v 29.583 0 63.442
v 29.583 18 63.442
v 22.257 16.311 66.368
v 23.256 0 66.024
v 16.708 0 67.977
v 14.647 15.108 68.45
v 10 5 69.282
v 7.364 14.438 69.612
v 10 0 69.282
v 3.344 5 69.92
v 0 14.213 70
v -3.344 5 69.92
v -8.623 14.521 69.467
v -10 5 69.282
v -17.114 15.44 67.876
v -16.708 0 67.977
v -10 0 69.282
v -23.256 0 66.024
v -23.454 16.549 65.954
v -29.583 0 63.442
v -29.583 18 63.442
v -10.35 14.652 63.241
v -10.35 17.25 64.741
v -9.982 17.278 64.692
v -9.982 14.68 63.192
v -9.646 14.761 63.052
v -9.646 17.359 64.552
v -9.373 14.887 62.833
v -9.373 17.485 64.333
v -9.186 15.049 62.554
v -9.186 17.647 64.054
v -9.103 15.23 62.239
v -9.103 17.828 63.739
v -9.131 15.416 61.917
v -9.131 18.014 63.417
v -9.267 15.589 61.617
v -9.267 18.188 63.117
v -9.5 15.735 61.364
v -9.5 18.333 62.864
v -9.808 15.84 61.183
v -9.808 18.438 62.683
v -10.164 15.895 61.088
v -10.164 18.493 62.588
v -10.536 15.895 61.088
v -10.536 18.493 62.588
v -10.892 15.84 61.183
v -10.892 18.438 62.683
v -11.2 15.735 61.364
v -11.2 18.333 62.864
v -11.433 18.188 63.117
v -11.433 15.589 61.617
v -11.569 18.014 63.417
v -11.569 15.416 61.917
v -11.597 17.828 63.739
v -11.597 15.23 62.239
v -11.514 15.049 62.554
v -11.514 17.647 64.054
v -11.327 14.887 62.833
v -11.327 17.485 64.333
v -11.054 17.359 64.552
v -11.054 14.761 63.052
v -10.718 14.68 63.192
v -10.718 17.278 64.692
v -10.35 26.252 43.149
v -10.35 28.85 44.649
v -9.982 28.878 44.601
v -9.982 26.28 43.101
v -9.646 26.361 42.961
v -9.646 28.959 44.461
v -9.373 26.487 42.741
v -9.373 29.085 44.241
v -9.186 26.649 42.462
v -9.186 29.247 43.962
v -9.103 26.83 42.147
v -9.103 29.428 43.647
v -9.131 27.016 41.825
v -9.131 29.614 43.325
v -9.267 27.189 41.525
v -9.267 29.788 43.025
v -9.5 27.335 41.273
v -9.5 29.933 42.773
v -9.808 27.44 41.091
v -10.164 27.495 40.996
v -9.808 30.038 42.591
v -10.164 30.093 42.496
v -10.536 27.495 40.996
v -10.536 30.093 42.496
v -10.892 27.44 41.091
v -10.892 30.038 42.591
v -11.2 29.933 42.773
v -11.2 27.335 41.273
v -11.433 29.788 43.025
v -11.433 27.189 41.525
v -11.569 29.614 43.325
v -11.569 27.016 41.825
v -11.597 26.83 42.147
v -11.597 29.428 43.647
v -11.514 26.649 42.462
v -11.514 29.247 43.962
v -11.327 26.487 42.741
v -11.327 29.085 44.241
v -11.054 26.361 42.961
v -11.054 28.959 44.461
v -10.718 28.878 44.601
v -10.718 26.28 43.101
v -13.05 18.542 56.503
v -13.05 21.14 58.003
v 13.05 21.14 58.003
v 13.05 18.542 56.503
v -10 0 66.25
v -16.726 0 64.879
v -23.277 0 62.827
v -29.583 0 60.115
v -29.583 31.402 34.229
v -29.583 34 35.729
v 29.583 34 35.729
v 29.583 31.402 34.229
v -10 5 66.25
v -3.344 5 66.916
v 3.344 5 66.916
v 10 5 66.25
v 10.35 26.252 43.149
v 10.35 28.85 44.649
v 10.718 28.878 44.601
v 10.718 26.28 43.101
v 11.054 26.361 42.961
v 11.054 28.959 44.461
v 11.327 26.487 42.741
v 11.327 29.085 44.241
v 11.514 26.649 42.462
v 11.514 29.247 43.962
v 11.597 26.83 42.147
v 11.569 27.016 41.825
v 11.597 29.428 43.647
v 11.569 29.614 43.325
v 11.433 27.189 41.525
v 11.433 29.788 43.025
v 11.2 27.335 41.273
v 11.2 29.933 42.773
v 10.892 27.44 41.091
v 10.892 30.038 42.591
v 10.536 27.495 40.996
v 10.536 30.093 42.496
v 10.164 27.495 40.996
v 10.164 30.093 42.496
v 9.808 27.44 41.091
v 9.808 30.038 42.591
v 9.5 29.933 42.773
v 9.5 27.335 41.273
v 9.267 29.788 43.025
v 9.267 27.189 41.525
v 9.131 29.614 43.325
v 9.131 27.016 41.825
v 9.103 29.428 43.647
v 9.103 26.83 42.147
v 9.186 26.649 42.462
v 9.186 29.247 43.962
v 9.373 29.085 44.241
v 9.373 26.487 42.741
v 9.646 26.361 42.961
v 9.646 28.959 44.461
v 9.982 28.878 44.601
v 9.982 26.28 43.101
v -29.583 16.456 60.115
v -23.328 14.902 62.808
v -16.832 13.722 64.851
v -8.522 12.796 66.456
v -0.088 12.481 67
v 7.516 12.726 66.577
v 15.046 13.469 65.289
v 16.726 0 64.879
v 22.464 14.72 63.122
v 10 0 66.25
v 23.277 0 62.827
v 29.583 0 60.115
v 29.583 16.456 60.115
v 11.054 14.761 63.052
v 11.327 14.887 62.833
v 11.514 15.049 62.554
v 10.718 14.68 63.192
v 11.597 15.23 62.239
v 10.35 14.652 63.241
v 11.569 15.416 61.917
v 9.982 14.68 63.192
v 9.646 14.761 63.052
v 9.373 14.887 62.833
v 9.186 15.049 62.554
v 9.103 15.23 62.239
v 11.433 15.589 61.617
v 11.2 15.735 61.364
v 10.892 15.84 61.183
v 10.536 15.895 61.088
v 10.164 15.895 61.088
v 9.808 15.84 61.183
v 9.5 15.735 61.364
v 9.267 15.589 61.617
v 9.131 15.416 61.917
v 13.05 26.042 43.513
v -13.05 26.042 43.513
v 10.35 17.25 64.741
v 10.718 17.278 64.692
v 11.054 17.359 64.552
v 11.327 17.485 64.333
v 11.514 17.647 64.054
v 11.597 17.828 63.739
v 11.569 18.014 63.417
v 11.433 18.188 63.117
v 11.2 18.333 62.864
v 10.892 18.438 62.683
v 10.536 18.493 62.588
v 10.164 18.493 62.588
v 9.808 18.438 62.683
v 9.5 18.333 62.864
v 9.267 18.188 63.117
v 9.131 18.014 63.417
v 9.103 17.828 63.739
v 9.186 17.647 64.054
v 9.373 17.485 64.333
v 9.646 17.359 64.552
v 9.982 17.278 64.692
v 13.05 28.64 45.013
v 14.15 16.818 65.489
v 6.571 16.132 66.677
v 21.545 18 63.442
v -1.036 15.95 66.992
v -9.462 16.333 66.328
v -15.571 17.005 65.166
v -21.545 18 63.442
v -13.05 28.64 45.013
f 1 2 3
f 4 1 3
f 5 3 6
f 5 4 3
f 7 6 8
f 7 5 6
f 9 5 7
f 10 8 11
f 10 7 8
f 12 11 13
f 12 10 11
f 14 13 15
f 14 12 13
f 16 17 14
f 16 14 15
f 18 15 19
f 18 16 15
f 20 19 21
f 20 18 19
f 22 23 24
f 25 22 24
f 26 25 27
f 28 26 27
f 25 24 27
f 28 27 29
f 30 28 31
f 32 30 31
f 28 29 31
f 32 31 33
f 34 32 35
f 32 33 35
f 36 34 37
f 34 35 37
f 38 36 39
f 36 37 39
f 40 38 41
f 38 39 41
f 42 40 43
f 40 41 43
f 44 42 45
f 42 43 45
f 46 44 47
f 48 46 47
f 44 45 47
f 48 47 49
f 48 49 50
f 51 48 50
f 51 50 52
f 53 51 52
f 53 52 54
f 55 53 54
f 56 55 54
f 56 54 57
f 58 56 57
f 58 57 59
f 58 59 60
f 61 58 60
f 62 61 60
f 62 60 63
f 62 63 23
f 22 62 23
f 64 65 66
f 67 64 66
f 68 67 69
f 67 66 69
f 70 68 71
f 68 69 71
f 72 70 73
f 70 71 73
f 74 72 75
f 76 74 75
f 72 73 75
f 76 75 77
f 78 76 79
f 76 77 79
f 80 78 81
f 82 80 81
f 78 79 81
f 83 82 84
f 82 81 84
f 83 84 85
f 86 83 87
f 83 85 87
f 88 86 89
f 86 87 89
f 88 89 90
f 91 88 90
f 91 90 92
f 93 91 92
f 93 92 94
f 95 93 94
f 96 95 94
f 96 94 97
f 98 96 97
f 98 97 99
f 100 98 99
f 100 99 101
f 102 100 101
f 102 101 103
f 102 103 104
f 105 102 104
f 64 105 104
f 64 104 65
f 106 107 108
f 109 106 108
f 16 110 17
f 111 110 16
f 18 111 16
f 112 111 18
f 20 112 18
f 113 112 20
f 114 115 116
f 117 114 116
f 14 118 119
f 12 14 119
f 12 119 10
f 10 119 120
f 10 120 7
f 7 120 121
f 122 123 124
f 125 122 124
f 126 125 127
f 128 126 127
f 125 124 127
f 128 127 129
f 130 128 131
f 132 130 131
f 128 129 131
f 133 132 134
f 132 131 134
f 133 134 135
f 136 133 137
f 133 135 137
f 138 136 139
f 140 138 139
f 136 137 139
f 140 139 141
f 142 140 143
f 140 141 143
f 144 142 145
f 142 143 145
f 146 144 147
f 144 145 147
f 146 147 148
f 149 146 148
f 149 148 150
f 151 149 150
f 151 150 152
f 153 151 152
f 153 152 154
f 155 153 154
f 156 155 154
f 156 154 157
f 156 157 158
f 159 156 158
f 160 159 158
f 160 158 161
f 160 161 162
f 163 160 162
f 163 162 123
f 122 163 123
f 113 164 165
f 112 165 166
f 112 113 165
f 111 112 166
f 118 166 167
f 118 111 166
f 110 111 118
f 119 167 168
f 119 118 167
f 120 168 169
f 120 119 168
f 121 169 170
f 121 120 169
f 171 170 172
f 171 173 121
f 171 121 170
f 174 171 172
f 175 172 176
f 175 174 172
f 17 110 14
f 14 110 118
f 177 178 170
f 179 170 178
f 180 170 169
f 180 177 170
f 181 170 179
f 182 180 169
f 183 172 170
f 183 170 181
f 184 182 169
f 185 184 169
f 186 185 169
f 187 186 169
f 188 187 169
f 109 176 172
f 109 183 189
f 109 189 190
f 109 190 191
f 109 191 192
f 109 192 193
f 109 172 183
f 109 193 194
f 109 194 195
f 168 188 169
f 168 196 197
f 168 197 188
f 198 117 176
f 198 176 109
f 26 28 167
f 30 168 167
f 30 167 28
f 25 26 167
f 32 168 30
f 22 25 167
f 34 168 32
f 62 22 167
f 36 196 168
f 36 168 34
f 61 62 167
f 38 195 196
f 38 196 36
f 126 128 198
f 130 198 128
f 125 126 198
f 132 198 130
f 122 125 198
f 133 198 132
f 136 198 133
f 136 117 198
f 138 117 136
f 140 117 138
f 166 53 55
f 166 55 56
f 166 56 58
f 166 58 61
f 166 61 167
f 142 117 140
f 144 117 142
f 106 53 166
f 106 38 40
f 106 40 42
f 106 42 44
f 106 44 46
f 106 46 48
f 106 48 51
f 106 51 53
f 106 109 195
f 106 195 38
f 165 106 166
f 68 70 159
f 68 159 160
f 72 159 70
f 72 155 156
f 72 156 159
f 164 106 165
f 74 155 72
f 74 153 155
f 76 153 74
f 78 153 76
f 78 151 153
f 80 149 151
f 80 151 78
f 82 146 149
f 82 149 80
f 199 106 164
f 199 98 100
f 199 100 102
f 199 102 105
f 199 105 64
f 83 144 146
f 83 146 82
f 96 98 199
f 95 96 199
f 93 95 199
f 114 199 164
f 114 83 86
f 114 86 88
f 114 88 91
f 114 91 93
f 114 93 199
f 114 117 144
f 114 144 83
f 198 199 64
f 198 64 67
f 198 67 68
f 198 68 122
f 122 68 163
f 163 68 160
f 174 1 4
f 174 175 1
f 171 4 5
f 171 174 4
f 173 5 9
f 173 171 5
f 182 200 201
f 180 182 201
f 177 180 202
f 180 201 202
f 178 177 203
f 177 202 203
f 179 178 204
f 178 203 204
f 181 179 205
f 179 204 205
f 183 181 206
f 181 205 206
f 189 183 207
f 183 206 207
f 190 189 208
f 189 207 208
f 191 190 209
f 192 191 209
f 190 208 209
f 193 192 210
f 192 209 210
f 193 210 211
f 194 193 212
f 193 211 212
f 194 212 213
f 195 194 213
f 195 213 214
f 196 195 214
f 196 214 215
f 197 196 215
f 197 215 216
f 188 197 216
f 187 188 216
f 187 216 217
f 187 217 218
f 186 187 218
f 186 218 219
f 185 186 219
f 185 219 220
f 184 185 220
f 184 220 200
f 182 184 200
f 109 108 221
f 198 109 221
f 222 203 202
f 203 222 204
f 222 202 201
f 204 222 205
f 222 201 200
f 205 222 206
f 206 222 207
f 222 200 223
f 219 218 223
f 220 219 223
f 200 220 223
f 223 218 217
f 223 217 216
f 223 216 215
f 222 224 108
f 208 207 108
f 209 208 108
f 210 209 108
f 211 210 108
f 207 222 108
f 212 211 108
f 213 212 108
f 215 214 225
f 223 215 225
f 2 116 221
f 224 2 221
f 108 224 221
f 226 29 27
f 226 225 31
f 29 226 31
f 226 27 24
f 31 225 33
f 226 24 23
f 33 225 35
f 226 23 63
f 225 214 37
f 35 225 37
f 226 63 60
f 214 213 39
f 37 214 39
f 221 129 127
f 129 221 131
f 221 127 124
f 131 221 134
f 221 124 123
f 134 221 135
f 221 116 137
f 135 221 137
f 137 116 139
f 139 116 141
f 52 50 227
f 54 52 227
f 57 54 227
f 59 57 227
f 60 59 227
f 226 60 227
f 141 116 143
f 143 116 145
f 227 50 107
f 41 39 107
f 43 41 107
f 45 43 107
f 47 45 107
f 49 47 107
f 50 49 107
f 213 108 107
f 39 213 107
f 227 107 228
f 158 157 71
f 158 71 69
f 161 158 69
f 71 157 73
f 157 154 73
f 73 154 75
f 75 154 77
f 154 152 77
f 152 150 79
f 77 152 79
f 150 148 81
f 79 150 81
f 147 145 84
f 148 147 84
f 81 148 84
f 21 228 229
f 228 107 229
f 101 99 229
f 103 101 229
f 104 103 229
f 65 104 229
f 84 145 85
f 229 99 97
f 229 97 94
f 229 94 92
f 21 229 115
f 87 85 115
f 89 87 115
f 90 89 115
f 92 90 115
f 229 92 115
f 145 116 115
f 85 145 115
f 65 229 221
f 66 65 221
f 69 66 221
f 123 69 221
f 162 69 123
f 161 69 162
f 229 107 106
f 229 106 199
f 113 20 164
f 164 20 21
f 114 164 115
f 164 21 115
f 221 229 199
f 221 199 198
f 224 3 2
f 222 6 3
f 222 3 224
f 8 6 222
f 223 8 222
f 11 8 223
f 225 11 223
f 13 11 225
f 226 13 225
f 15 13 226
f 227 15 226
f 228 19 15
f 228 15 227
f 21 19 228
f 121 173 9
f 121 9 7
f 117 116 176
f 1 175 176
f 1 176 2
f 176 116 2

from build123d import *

# Parameters (mm, degrees)
BOSS_EXTRUDE1_DEPTH     = 18
BOSS_EXTRUDE2_DEPTH     = 3
CUT_EXTRUDE3_DEPTH      = 84.253650708
CUT_EXTRUDE3_DEPTH_BACK = 84.253650708
CUT_EXTRUDE4_DEPTH      = 84.253650708
SKETCH5_R               = 1.25
SKETCH5_W               = 26.1
SKETCH5_H               = 15
CUT_EXTRUDE1_DEPTH      = 7
SKETCH6_W               = 20
SKETCH6_H               = 10
CUT_EXTRUDE2_DEPTH      = 84.253650708


with BuildPart() as part:
    # Sketch1 → Boss-Extrude1 (new body)
    with BuildSketch(Plane(origin=(0, 0, 0), x_dir=(1, 0, 0), z_dir=(0, 1, 0))):
        with BuildLine():
            Line((-29.583278322, -63.441545093), (-29.583278322, -60.115136561))
            ThreePointArc((-29.583278322, -60.115136561), (0, -67), (29.583278322, -60.115136561))
            Line((29.583278322, -60.115136561), (29.583278322, -63.441545093))
            ThreePointArc((29.583278322, -63.441545093), (0, -70), (-29.583278322, -63.441545093))
        make_face()
    extrude(amount=BOSS_EXTRUDE1_DEPTH)

    # Sketch3 → Boss-Extrude2 (add)
    with BuildSketch(Plane(origin=(0, 40.970994853, 23.654614907), x_dir=(-1, 0, 0), z_dir=(-1.9937140685199517e-15, -0.8660254037844395, -0.49999999999999856))):
        Polygon((29.583278322, -45.941989705), (29.583278322, -13.941989705), (-29.583278322, -13.941989705), (-29.583278322, -45.941989705), (-29.583278322, -53.515041118), (29.583278322, -53.515041118), align=None)
    extrude(amount=BOSS_EXTRUDE2_DEPTH)

    # Sketch7 → Cut-Extrude3 (cut, two sides: drawn at the far end of the back side and taken through both)
    with BuildSketch(Plane(origin=(0, 0, 0), x_dir=(0, 0, -1), z_dir=(1, 0, 0)).offset(-CUT_EXTRUDE3_DEPTH_BACK)):
        Polygon((-70, 14.213474294), (-63.441545093, 18), (-70, 18), align=None)
    extrude(amount=CUT_EXTRUDE3_DEPTH + CUT_EXTRUDE3_DEPTH_BACK, mode=Mode.SUBTRACT)

    # Sketch8 → Cut-Extrude4 (cut, through all)
    with BuildSketch(Plane.XZ):
        with BuildLine():
            Line((-29.583278322, 63.441545093), (-29.583278322, 71.549825609))
            Line((-29.583278322, 71.549825609), (29.583278322, 71.549825609))
            Line((29.583278322, 71.549825609), (29.583278322, 63.441545093))
            ThreePointArc((29.583278322, 63.441545093), (0, 70), (-29.583278322, 63.441545093))
        make_face()
    extrude(amount=-CUT_EXTRUDE4_DEPTH, mode=Mode.SUBTRACT)

    # Sketch5 → Cut-Extrude1 (cut)
    with BuildSketch(Plane(origin=(0, 40.970994853, 23.654614907), x_dir=(1, 0, 0), z_dir=(2.0433685445882858e-15, 0.8660254037844395, 0.49999999999999845))):
        with Locations(Location((-10.35, -22.991989705, 0), (0, 0, 270))):
            Circle(SKETCH5_R)
        with Locations(Location((10.35, -22.991989705, 0), (0, 0, 270))):
            Circle(SKETCH5_R)
        with Locations(Location((10.35, -46.191989705, 0), (0, 0, 270))):
            Circle(SKETCH5_R)
        with Locations(Location((-10.35, -46.191989705, 0), (0, 0, 270))):
            Circle(SKETCH5_R)
        with Locations((0, -32.161989705)):
            Rectangle(SKETCH5_W, SKETCH5_H)
    extrude(amount=-CUT_EXTRUDE1_DEPTH, mode=Mode.SUBTRACT)

    # Sketch6 → Cut-Extrude2 (cut, through all)
    with BuildSketch(Plane.XY):
        Rectangle(SKETCH6_W, SKETCH6_H)
    extrude(amount=CUT_EXTRUDE2_DEPTH, mode=Mode.SUBTRACT)


solid = part.part
